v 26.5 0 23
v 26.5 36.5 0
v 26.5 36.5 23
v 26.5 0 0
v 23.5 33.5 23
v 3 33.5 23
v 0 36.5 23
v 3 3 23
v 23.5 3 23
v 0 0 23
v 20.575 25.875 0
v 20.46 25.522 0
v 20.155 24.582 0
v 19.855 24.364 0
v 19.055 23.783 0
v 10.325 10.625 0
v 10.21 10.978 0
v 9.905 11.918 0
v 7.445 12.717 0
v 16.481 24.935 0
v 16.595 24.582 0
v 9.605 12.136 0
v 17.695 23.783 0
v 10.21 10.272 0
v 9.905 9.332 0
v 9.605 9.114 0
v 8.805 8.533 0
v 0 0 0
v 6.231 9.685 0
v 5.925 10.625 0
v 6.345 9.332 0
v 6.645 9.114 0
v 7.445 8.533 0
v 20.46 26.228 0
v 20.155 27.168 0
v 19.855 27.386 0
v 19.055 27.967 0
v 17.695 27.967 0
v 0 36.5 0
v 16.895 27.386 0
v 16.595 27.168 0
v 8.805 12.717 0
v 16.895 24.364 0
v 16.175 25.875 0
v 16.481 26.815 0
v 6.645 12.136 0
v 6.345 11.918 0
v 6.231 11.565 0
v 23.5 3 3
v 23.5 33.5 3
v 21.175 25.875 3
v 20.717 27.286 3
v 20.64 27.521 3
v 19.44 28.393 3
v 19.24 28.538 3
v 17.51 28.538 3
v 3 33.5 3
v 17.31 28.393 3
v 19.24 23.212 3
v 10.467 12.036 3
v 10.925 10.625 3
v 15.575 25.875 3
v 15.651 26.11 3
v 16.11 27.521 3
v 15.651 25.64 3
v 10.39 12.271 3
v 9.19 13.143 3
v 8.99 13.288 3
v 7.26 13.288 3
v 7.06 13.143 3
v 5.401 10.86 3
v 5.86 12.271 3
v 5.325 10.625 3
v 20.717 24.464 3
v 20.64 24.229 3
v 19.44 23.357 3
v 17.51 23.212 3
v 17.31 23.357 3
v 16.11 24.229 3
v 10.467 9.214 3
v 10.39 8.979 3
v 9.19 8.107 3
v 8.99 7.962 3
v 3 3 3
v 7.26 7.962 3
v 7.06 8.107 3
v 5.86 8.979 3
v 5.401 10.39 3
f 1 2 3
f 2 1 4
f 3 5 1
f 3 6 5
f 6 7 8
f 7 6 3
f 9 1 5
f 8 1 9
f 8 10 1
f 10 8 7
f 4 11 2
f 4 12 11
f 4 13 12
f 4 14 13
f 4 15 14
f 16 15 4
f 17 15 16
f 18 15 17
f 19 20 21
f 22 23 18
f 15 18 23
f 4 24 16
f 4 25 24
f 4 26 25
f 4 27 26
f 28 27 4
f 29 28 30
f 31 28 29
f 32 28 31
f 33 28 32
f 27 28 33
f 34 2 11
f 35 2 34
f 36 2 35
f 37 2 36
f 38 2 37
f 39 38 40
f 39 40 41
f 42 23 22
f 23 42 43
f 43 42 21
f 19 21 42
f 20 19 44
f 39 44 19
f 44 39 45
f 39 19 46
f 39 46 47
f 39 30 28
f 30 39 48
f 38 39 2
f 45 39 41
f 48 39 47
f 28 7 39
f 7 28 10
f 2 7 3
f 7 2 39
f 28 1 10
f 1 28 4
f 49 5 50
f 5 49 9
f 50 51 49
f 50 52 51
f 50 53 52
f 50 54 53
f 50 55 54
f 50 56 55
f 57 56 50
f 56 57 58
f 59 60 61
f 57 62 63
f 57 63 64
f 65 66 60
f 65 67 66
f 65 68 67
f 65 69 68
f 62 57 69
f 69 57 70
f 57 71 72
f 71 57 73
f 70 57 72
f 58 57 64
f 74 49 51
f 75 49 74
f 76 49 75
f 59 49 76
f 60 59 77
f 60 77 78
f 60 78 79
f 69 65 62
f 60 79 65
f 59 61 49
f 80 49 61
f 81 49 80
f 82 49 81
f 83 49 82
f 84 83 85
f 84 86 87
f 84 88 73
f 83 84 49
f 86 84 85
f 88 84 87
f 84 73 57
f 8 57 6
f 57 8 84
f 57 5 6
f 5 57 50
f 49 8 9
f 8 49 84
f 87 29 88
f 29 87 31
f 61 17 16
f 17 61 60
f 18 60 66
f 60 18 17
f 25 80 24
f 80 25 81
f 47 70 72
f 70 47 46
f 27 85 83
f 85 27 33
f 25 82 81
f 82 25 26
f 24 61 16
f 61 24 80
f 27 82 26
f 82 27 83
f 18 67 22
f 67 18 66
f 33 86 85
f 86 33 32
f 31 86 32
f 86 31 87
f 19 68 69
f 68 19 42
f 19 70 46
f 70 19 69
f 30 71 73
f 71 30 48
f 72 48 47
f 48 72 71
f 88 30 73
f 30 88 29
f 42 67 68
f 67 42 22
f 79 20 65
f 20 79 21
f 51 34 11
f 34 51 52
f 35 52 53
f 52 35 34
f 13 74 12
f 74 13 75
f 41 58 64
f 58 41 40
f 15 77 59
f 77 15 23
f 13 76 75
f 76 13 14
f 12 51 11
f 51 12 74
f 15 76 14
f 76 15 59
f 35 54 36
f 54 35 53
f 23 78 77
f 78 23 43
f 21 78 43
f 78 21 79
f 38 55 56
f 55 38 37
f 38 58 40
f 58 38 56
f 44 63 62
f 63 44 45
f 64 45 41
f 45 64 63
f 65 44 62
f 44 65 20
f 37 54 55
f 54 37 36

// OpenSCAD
module brace(inner_length, inner_width, inner_height, wall_thickness) {
    difference() {
        cube([inner_length + wall_thickness*2, inner_width + wall_thickness*2, inner_height + wall_thickness]);
        
        translate([wall_thickness, wall_thickness, wall_thickness])
            cube([inner_length, inner_width, inner_height+1]);
        
        translate([inner_length*0.25 + wall_thickness, inner_width*0.25 + wall_thickness, -1])
            cylinder(h = wall_thickness+2, r1 = 2, r2=3);
                translate([inner_length*0.75 + wall_thickness, inner_width*0.75 + wall_thickness, -1])
            cylinder(h = wall_thickness+2, r1 = 2, r2=3);
    };
}

brace(20.5, 30.5, 20, 3);
